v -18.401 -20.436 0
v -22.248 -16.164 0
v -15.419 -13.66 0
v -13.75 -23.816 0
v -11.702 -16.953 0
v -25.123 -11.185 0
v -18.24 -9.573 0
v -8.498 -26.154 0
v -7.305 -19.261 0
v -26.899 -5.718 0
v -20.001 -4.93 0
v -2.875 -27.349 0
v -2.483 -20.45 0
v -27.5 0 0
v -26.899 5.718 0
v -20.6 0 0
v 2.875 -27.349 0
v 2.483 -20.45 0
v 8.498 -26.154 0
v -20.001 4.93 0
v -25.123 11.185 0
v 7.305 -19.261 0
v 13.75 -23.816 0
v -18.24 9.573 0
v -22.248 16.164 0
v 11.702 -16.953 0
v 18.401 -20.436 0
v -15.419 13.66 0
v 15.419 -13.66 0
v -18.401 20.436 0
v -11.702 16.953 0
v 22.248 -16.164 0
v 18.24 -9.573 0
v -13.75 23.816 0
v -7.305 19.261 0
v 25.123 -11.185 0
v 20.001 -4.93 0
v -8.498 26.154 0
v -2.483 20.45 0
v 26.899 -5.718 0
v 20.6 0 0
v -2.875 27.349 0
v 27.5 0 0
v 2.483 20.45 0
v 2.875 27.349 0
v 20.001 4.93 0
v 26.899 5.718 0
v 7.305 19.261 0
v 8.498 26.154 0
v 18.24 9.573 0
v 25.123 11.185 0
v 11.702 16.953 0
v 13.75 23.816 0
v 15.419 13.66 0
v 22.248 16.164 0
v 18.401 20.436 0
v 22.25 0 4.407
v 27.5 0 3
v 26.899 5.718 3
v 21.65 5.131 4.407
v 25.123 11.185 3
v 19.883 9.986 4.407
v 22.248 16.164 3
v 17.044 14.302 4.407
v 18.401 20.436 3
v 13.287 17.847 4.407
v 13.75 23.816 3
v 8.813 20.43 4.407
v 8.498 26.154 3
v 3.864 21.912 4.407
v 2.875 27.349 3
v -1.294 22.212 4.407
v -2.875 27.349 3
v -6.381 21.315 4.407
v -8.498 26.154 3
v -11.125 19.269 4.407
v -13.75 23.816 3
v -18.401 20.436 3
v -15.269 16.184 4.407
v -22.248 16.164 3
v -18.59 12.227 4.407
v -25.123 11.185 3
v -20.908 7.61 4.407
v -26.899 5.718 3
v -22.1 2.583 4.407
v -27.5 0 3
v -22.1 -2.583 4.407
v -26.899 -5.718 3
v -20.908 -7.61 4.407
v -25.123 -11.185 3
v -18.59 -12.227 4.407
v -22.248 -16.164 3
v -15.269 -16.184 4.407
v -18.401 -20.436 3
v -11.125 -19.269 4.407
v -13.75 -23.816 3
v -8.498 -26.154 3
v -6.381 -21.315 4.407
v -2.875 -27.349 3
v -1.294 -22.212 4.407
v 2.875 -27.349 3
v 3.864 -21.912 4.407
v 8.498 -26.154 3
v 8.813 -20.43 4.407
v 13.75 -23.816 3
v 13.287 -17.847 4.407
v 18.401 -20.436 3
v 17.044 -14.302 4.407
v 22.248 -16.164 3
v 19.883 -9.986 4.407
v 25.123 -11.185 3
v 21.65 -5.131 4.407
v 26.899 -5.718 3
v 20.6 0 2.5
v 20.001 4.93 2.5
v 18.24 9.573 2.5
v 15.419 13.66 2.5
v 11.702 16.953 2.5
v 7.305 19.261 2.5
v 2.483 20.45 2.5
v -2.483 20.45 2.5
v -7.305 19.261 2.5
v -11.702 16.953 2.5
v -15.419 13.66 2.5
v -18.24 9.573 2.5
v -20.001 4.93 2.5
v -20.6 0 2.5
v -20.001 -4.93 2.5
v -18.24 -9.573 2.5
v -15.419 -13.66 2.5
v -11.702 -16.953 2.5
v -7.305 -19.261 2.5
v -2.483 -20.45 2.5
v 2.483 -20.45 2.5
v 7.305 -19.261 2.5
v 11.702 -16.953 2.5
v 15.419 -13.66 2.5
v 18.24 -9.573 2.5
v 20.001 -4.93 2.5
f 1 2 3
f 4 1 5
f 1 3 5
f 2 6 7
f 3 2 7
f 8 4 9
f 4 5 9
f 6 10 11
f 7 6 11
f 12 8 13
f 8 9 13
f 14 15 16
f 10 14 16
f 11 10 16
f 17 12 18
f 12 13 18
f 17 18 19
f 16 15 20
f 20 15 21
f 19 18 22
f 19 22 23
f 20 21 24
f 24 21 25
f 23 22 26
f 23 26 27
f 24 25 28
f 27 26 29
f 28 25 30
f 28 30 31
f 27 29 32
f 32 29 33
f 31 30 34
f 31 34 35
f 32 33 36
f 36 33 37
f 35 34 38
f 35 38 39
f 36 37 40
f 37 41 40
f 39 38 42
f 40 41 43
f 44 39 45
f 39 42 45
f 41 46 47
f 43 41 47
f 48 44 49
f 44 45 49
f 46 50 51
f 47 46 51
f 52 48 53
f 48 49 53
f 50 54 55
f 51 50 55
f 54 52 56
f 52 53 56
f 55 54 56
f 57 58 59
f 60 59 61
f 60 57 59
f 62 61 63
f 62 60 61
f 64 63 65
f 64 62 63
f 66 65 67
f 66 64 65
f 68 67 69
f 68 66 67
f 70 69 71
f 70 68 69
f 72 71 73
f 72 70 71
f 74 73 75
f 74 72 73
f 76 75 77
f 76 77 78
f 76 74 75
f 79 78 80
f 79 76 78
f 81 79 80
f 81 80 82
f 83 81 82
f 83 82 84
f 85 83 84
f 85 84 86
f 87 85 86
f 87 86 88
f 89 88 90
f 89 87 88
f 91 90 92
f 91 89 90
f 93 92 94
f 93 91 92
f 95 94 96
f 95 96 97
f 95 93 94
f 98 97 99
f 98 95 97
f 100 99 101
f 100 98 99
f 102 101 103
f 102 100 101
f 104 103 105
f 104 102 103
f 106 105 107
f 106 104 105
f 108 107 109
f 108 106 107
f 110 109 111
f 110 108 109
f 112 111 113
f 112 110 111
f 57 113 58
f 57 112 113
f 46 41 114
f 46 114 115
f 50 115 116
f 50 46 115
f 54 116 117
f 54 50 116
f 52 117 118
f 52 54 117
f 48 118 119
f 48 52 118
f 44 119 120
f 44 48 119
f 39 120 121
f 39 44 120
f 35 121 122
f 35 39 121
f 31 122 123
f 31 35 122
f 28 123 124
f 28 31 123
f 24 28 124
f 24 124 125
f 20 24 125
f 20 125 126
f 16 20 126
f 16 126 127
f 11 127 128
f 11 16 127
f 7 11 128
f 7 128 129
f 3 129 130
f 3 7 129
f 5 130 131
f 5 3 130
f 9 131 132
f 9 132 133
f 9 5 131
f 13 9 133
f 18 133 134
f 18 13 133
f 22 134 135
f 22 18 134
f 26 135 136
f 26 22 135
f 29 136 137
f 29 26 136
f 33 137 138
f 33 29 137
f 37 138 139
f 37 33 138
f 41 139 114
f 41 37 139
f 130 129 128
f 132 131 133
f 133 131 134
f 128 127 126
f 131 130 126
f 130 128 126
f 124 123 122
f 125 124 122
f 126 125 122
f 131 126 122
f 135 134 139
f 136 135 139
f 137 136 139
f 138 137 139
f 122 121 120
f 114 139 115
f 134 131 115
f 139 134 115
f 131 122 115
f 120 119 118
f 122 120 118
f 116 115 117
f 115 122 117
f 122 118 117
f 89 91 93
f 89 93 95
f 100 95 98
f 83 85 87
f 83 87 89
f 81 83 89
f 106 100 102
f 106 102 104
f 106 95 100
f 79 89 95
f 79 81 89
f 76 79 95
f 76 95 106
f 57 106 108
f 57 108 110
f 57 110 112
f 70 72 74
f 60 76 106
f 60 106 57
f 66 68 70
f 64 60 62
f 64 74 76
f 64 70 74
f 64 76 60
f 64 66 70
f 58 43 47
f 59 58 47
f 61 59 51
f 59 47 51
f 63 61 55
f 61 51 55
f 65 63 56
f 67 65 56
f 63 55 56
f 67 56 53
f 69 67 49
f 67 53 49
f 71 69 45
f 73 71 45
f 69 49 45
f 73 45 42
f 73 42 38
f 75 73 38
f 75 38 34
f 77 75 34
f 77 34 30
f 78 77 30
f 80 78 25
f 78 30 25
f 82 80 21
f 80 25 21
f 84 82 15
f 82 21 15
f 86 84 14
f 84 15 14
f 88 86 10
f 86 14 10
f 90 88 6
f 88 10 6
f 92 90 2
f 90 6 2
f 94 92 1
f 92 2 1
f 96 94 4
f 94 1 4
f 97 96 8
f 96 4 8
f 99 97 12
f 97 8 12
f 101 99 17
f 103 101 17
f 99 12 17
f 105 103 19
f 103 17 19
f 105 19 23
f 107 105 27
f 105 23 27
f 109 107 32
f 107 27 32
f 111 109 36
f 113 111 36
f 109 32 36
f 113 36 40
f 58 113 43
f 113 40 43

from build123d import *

# Parameters (mm, degrees)
CYLINDER002_R     = 20.6
CYLINDER002_DEPTH = 2.5
CYLINDER_R        = 27.5
CYLINDER_DEPTH    = 3


with BuildPart() as cylinder002:
    # Cylinder002 → Cylinder002 (new body)
    with BuildSketch(Plane.XY):
        Circle(CYLINDER002_R)
    extrude(amount=CYLINDER002_DEPTH)


with BuildPart() as cone:
    # Cone → Cone (revolve)
    with BuildSketch(Plane(origin=(0, 0, 3), x_dir=(1, 0, 0), z_dir=(0, -1, 0))):
        Polygon((0, 0), (27.5, 0), (22.25, 1.406733), (0, 1.406733), align=None)
    revolve(axis=Axis((0, 0, 3), (0, 0, 1)))


with BuildPart() as kfblank:
    # Cylinder → Cylinder (new body)
    with BuildSketch(Plane.XY):
        Circle(CYLINDER_R)
    extrude(amount=CYLINDER_DEPTH)

    # Fusion: union Cone
    add(cone.part)

    # Cut: cut Cylinder002
    add(cylinder002.part, mode=Mode.SUBTRACT)


solid = kfblank.part
